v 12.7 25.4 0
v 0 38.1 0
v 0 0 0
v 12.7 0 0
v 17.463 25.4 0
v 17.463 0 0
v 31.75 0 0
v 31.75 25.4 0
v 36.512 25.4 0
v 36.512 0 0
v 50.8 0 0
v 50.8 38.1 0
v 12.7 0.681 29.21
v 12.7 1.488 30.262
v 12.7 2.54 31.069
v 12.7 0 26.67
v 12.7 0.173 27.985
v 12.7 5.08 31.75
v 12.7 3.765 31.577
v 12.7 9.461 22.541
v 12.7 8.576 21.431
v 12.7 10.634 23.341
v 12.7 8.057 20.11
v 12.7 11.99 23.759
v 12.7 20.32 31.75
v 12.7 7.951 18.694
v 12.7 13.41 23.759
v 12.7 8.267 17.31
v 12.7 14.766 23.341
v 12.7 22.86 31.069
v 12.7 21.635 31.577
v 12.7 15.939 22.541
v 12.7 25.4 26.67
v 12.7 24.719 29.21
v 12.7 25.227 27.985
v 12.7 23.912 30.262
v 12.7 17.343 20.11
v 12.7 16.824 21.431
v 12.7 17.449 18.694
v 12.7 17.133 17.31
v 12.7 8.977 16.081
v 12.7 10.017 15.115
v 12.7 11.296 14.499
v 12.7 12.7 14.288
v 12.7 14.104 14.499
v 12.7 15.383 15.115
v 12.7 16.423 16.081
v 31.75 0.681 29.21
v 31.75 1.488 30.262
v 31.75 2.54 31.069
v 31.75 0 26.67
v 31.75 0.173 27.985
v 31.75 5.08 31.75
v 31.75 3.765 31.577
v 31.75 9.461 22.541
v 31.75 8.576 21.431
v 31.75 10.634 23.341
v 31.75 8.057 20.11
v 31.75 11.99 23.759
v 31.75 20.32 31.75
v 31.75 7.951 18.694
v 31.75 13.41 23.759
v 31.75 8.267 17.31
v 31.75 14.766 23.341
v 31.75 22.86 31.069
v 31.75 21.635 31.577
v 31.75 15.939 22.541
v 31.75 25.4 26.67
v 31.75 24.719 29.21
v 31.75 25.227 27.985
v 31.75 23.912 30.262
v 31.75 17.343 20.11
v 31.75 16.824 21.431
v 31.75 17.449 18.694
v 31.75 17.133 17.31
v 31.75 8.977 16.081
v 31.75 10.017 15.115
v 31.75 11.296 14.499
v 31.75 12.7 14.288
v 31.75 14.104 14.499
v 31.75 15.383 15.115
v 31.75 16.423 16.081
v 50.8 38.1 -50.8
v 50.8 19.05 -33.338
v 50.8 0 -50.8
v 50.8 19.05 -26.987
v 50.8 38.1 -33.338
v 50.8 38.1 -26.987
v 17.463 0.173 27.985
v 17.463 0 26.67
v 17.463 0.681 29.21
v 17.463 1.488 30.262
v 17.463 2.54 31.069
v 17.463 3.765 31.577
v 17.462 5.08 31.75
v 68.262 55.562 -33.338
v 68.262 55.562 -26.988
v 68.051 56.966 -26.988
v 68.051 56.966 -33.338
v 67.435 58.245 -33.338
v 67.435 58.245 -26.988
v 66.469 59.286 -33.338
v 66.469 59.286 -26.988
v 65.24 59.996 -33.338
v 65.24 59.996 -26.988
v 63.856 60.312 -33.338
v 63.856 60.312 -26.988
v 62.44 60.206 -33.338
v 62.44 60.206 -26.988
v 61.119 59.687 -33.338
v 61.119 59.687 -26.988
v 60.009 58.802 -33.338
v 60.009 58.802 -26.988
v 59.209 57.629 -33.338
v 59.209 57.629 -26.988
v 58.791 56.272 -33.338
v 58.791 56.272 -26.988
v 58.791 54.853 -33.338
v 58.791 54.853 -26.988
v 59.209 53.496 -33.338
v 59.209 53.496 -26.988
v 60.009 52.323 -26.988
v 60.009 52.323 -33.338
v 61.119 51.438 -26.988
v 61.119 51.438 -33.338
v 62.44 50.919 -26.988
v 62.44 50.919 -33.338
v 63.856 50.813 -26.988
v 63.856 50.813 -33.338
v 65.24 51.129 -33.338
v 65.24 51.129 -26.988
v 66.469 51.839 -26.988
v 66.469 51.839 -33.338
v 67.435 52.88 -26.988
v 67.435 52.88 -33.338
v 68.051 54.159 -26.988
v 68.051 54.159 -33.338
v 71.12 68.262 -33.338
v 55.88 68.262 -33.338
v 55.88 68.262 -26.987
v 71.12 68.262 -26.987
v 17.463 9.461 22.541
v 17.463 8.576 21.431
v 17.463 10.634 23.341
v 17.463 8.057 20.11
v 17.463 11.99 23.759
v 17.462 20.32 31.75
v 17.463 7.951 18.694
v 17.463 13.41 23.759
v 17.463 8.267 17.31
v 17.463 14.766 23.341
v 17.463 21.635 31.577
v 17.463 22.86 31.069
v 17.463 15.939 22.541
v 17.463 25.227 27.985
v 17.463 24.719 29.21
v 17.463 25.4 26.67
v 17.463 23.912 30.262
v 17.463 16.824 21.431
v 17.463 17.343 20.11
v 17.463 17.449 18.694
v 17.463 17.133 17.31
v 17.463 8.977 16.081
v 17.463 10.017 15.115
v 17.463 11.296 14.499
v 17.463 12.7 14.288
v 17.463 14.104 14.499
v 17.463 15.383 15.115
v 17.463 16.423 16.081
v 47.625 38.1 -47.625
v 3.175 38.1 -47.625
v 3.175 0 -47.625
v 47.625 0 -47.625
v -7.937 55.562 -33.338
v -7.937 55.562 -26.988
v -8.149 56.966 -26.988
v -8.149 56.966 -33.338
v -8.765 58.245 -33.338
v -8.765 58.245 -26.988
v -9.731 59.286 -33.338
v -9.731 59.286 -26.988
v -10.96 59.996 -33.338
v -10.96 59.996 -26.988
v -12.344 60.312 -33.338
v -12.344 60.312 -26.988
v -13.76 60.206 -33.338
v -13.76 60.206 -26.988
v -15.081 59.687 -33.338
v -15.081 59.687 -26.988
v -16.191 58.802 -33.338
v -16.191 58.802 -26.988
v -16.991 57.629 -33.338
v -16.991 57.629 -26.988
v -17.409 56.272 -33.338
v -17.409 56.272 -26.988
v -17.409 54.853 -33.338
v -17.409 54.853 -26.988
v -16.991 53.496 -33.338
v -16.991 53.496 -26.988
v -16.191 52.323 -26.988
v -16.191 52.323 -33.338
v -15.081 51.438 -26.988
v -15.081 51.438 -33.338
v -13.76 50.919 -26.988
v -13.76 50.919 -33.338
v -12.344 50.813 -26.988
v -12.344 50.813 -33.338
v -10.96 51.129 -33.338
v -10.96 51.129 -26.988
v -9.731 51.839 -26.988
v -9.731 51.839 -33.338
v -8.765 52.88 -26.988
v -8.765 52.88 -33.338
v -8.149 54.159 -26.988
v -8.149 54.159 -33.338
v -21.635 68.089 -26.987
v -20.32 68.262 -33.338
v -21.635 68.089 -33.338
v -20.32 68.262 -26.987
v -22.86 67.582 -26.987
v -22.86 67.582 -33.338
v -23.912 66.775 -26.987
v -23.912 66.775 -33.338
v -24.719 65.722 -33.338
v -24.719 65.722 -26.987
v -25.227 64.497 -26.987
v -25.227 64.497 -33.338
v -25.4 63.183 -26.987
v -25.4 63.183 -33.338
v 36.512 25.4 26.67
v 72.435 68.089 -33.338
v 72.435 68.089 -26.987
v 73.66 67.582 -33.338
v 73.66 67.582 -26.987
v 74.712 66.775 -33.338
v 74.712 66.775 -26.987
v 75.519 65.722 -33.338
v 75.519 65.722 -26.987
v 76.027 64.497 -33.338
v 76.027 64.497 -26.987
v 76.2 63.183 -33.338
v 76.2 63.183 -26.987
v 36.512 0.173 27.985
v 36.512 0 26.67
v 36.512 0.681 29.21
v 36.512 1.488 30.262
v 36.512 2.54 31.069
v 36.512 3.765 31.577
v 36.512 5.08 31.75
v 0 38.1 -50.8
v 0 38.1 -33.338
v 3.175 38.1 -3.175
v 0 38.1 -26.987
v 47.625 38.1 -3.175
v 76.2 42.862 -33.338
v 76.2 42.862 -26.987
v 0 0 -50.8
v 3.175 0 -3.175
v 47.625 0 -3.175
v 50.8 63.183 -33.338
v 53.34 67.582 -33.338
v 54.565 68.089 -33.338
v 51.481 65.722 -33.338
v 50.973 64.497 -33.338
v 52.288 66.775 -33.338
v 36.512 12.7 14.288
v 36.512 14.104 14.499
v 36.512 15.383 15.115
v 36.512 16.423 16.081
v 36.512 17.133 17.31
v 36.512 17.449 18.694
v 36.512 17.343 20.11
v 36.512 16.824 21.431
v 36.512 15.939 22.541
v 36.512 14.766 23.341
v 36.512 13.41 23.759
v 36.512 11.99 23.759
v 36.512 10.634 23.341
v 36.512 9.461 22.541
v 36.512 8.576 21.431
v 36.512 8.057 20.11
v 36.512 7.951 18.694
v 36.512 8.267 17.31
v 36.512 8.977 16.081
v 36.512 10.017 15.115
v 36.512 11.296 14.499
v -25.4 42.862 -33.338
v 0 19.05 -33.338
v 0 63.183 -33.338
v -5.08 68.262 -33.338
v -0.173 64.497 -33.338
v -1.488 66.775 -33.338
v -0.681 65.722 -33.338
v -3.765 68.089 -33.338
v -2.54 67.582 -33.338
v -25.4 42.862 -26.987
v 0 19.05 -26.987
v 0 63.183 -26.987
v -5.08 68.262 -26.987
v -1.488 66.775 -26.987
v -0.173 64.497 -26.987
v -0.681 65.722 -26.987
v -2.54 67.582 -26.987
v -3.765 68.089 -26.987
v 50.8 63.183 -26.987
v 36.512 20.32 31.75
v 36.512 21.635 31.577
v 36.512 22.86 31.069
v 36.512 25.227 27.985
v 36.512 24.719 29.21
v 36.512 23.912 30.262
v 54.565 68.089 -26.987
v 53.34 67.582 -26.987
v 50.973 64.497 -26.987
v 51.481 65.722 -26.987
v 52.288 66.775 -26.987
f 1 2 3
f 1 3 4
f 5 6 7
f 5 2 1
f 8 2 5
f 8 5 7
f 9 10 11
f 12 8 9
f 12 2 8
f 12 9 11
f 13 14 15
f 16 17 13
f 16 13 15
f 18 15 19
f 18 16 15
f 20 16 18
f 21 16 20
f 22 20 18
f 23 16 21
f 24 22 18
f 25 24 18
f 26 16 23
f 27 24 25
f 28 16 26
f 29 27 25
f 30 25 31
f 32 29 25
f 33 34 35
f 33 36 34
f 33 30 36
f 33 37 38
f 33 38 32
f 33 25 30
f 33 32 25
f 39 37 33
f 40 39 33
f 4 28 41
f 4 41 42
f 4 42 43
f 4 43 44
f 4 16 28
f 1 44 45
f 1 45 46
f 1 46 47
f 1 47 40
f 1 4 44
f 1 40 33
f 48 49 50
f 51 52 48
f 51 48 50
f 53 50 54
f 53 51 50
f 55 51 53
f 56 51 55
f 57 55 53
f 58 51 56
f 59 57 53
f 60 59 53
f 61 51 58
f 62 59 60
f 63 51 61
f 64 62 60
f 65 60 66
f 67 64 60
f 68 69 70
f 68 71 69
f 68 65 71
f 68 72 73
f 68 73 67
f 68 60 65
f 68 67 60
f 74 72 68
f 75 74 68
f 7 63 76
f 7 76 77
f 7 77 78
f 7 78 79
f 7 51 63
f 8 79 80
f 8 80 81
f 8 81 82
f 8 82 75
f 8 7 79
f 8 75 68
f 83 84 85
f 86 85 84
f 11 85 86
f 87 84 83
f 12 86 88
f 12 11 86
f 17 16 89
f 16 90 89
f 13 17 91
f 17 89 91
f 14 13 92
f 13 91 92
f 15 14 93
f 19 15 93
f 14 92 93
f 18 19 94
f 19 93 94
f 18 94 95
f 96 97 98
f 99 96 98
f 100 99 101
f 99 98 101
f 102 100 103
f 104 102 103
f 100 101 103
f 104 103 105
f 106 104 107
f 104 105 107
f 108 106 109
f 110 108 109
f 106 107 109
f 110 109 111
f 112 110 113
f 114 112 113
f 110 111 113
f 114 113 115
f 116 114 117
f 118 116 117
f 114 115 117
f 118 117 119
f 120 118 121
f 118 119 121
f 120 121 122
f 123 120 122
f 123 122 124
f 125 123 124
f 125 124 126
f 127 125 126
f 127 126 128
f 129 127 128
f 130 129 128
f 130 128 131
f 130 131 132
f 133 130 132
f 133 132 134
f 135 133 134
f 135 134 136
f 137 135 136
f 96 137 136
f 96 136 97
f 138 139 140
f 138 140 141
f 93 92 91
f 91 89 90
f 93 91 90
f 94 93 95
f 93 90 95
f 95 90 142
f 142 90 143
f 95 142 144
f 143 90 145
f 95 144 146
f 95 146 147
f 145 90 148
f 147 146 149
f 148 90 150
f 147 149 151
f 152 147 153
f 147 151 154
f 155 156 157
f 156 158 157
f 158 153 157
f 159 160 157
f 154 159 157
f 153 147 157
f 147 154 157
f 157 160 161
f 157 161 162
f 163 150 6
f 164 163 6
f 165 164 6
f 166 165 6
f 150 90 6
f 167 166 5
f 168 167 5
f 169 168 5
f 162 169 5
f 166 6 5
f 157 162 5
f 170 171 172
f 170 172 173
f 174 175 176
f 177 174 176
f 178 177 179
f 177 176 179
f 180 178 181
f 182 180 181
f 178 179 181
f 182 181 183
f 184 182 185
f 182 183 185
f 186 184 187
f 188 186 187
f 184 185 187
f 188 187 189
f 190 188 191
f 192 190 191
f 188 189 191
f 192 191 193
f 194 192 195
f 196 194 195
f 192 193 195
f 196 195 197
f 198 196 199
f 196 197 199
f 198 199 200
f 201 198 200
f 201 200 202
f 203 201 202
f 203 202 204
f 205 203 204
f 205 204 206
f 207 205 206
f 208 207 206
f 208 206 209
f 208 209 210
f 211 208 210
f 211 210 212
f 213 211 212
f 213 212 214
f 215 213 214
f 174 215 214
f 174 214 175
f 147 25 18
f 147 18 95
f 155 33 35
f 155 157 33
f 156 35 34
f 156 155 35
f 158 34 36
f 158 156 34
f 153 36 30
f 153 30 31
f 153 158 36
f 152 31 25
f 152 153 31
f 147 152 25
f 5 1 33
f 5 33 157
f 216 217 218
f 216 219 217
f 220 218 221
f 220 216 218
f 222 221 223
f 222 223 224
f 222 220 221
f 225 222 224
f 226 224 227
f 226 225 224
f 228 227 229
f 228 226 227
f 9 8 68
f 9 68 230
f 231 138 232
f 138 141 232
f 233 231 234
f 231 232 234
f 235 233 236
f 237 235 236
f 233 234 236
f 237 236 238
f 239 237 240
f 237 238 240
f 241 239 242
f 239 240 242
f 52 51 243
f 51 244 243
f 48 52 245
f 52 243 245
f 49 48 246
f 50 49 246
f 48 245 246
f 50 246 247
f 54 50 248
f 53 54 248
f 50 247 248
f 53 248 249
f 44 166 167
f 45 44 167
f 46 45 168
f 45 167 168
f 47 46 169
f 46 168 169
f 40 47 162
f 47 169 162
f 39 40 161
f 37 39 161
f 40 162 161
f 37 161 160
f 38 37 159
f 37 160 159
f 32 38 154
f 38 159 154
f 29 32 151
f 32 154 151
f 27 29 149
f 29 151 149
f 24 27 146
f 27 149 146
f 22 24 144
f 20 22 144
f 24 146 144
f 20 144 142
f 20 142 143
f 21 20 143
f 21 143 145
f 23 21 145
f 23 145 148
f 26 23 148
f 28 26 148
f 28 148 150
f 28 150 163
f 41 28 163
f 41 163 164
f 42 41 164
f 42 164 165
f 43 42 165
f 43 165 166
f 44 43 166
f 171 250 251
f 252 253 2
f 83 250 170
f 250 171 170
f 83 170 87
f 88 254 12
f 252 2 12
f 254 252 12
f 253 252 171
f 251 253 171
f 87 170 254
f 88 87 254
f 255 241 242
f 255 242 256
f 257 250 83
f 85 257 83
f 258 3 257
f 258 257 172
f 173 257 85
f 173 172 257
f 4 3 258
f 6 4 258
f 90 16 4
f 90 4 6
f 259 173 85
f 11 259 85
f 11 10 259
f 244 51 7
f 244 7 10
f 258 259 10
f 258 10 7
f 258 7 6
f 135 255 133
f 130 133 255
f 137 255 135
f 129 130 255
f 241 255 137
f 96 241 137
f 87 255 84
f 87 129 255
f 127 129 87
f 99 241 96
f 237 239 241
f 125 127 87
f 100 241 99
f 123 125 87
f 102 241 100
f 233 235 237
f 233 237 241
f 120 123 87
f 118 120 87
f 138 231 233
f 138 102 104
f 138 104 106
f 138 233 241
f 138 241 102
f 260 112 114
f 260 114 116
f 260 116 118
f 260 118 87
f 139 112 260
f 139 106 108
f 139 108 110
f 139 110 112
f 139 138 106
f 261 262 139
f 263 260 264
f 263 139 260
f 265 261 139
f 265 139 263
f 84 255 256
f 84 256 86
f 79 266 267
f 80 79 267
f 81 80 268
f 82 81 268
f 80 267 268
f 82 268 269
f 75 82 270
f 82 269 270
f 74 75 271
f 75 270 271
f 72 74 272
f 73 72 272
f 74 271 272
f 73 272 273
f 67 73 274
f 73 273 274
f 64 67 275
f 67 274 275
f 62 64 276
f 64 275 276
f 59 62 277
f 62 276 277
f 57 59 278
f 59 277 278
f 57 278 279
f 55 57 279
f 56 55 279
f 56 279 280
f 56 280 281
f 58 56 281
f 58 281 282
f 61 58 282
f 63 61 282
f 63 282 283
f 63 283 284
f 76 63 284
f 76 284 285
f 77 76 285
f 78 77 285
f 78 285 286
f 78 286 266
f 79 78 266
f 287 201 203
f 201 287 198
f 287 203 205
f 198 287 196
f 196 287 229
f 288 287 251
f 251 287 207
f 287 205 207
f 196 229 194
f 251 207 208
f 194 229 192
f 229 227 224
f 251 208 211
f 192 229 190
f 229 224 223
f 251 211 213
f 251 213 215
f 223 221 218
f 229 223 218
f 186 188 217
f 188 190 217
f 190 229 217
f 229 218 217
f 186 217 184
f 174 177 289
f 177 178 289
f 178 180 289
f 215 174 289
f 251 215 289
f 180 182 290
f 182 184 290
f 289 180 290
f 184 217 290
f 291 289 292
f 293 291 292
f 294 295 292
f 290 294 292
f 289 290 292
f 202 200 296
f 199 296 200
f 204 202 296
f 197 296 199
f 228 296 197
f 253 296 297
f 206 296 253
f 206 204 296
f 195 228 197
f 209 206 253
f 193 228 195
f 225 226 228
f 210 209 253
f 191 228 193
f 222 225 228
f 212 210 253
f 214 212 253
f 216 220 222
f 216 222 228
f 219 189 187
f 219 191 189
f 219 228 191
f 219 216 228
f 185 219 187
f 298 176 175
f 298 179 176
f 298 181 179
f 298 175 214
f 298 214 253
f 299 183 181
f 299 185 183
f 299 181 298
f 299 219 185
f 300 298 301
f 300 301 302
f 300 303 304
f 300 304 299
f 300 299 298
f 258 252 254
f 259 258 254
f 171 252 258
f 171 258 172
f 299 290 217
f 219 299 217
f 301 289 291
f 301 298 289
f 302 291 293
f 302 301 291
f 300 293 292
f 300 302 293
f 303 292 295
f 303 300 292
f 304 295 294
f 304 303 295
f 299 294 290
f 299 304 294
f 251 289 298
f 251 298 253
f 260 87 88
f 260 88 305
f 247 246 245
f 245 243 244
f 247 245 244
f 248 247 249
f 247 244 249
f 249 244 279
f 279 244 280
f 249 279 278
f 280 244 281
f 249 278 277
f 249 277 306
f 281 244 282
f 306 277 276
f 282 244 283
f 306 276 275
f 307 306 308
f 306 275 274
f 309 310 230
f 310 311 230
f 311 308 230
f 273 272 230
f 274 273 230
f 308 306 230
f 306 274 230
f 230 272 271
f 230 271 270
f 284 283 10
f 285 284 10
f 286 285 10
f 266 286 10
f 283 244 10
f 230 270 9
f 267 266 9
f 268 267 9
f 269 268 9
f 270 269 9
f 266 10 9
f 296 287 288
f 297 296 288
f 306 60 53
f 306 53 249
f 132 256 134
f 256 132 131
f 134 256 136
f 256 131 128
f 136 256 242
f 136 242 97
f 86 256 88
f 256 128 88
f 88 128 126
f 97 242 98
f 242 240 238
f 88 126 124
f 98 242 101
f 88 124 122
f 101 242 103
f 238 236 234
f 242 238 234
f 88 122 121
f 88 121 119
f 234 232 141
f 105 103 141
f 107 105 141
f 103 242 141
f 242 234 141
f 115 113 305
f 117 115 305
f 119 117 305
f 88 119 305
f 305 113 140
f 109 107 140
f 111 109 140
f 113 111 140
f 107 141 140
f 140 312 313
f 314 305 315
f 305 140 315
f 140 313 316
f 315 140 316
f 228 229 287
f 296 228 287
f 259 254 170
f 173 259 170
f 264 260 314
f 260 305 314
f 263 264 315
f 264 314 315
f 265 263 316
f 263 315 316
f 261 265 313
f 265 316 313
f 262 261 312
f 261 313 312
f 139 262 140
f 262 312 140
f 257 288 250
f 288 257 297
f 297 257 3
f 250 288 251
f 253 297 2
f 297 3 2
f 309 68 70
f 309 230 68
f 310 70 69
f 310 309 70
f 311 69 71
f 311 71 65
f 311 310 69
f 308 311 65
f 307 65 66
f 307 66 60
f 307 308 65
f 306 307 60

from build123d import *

# Parameters (mm, degrees)
SKETCH2_W           = 50.8
SKETCH2_H           = 38.1
BOSS_EXTRUDE1_DEPTH = 50.8
SKETCH5_W           = 44.45
SKETCH5_H           = 44.45
CUT_EXTRUDE3_DEPTH  = 82.319677815
SKETCH7_W           = 4.7625
SKETCH7_H           = 25.4
BOSS_EXTRUDE2_DEPTH = 31.75
FILLET1_R           = 5.08
SKETCH8_R           = 4.7625
CUT_EXTRUDE4_DEPTH  = 74.248977169
BOSS_EXTRUDE3_DEPTH = 6.35
SKETCH10_R          = 4.7625
CUT_EXTRUDE5_DEPTH  = 118.96738029
FILLET2_R           = 5.08


with BuildPart() as part:
    # Sketch2 → Boss-Extrude1 (new body)
    with BuildSketch(Plane.XY):
        with Locations((25.4, 19.05)):
            Rectangle(SKETCH2_W, SKETCH2_H)
    extrude(amount=-BOSS_EXTRUDE1_DEPTH)

    # Sketch5 → Cut-Extrude3 (cut, through all)
    with BuildSketch(Plane(origin=(0, 38.1, 0), x_dir=(1, 0, 0), z_dir=(0, 1, 0))):
        with Locations((25.4, 25.4)):
            Rectangle(SKETCH5_W, SKETCH5_H)
    extrude(amount=-CUT_EXTRUDE3_DEPTH, mode=Mode.SUBTRACT)

    # Sketch7 → Boss-Extrude2 (add)
    with BuildSketch(Plane.XY):
        with Locations((15.08125, 12.7)):
            Rectangle(SKETCH7_W, SKETCH7_H)
        with Locations((34.13125, 12.7)):
            Rectangle(SKETCH7_W, SKETCH7_H)
    extrude(amount=BOSS_EXTRUDE2_DEPTH)

    # Fillet1
    fillet1_edges = [part.edges().sort_by_distance(p)[0] for p in [
        (15.08125, 0, 31.75),
        (15.08125, 25.4, 31.75),
        (34.13125, 0, 31.75),
        (34.13125, 25.4, 31.75),
    ]]
    fillet(fillet1_edges, radius=FILLET1_R)

    # Sketch8 → Cut-Extrude4 (cut, through all)
    with BuildSketch(Plane(origin=(36.5125, 0, 0), x_dir=(0, 0, -1), z_dir=(1, 0, 0))):
        with Locations((-19.05, 12.7)):
            Circle(SKETCH8_R)
    extrude(amount=-CUT_EXTRUDE4_DEPTH, mode=Mode.SUBTRACT)

    # Sketch9 → Boss-Extrude3 (add)
    with BuildSketch(Plane(origin=(0, 0, -33.3375), x_dir=(-1, 0, 0), z_dir=(0, 0, -1))):
        Polygon((0, 38.1), (0, 68.2625), (25.4, 68.2625), (25.4, 42.8625), (0, 19.05), align=None)
        Polygon((-76.2, 42.8625), (-50.8, 19.05), (-50.8, 38.1), (-50.8, 68.2625), (-76.2, 68.2625), align=None)
    extrude(amount=-BOSS_EXTRUDE3_DEPTH)

    # Sketch10 → Cut-Extrude5 (cut, through all)
    with BuildSketch(Plane.XY.offset(-26.9875)):
        with Locations((-12.7, 55.5625)):
            Circle(SKETCH10_R)
        with Locations((63.5, 55.5625)):
            Circle(SKETCH10_R)
    extrude(amount=-CUT_EXTRUDE5_DEPTH, mode=Mode.SUBTRACT)

    # Fillet2
    fillet2_edges = [part.edges().sort_by_distance(p)[0] for p in [
        (76.2, 68.2625, -30.1625),
        (50.8, 68.2625, -30.1625),
        (0, 68.2625, -30.1625),
        (-25.4, 68.2625, -30.1625),
    ]]
    fillet(fillet2_edges, radius=FILLET2_R)


solid = part.part
